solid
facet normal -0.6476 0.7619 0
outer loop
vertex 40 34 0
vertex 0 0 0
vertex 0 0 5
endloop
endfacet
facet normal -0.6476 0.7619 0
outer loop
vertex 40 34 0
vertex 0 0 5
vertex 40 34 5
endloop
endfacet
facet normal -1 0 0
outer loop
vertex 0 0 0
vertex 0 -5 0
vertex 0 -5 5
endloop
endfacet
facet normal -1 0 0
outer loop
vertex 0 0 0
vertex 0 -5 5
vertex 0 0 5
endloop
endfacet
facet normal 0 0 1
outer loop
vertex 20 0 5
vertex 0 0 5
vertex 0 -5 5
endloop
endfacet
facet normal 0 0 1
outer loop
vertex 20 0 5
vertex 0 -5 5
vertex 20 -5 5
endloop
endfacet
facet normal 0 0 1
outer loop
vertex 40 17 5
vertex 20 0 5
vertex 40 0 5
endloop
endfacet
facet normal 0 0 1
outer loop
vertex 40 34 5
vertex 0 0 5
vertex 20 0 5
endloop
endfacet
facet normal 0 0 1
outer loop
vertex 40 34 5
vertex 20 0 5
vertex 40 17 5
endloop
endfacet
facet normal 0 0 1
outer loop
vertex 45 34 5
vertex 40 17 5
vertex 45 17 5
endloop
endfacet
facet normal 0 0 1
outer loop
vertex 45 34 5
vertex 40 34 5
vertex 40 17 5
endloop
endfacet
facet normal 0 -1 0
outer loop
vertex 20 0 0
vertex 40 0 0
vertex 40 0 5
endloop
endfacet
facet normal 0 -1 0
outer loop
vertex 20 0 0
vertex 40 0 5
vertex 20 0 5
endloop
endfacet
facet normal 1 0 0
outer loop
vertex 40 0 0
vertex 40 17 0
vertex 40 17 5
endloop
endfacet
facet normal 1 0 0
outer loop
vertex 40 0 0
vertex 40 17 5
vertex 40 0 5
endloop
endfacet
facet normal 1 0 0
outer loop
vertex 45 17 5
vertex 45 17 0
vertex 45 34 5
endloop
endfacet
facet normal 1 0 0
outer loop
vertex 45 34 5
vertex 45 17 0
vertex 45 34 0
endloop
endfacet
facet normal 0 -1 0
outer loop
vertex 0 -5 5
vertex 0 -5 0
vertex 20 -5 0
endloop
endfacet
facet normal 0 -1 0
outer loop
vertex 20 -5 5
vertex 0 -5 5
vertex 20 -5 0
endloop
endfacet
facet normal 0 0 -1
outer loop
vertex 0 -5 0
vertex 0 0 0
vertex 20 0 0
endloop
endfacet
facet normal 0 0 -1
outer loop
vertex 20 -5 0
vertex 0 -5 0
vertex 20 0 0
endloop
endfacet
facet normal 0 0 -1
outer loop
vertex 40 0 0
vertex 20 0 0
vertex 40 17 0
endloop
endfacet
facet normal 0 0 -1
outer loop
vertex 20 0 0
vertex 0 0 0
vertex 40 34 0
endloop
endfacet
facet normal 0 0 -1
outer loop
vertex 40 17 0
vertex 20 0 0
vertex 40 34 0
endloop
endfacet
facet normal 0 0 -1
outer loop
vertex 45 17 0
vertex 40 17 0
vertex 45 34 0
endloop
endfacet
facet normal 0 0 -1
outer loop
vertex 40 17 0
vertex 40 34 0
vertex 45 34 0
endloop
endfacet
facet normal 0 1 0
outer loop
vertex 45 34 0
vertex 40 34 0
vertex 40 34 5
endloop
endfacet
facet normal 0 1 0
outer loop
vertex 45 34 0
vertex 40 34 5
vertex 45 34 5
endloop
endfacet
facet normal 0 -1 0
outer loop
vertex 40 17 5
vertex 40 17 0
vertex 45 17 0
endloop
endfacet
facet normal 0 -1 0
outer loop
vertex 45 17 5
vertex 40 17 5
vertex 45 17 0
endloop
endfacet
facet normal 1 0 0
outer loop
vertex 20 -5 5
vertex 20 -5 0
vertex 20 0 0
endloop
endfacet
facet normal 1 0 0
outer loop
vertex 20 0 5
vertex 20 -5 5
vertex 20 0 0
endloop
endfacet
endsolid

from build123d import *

# Parameters (mm, degrees)
CROQUIS1_W              = 5
CROQUIS1_H              = 17
CROQUIS1_W_2            = 20
CROQUIS1_H_2            = 5
SALIENTE_EXTRUIR1_DEPTH = 5


with BuildPart() as part:
    # Croquis1 → Saliente-Extruir1 (new body)
    with BuildSketch(Plane.XY):
        with Locations((42.5, 25.5)):
            Rectangle(CROQUIS1_W, CROQUIS1_H)
        Polygon((40, 0), (0, 0), (40, 34), align=None)
        with Locations((10, -2.5)):
            Rectangle(CROQUIS1_W_2, CROQUIS1_H_2)
    extrude(amount=SALIENTE_EXTRUIR1_DEPTH)


solid = part.part
